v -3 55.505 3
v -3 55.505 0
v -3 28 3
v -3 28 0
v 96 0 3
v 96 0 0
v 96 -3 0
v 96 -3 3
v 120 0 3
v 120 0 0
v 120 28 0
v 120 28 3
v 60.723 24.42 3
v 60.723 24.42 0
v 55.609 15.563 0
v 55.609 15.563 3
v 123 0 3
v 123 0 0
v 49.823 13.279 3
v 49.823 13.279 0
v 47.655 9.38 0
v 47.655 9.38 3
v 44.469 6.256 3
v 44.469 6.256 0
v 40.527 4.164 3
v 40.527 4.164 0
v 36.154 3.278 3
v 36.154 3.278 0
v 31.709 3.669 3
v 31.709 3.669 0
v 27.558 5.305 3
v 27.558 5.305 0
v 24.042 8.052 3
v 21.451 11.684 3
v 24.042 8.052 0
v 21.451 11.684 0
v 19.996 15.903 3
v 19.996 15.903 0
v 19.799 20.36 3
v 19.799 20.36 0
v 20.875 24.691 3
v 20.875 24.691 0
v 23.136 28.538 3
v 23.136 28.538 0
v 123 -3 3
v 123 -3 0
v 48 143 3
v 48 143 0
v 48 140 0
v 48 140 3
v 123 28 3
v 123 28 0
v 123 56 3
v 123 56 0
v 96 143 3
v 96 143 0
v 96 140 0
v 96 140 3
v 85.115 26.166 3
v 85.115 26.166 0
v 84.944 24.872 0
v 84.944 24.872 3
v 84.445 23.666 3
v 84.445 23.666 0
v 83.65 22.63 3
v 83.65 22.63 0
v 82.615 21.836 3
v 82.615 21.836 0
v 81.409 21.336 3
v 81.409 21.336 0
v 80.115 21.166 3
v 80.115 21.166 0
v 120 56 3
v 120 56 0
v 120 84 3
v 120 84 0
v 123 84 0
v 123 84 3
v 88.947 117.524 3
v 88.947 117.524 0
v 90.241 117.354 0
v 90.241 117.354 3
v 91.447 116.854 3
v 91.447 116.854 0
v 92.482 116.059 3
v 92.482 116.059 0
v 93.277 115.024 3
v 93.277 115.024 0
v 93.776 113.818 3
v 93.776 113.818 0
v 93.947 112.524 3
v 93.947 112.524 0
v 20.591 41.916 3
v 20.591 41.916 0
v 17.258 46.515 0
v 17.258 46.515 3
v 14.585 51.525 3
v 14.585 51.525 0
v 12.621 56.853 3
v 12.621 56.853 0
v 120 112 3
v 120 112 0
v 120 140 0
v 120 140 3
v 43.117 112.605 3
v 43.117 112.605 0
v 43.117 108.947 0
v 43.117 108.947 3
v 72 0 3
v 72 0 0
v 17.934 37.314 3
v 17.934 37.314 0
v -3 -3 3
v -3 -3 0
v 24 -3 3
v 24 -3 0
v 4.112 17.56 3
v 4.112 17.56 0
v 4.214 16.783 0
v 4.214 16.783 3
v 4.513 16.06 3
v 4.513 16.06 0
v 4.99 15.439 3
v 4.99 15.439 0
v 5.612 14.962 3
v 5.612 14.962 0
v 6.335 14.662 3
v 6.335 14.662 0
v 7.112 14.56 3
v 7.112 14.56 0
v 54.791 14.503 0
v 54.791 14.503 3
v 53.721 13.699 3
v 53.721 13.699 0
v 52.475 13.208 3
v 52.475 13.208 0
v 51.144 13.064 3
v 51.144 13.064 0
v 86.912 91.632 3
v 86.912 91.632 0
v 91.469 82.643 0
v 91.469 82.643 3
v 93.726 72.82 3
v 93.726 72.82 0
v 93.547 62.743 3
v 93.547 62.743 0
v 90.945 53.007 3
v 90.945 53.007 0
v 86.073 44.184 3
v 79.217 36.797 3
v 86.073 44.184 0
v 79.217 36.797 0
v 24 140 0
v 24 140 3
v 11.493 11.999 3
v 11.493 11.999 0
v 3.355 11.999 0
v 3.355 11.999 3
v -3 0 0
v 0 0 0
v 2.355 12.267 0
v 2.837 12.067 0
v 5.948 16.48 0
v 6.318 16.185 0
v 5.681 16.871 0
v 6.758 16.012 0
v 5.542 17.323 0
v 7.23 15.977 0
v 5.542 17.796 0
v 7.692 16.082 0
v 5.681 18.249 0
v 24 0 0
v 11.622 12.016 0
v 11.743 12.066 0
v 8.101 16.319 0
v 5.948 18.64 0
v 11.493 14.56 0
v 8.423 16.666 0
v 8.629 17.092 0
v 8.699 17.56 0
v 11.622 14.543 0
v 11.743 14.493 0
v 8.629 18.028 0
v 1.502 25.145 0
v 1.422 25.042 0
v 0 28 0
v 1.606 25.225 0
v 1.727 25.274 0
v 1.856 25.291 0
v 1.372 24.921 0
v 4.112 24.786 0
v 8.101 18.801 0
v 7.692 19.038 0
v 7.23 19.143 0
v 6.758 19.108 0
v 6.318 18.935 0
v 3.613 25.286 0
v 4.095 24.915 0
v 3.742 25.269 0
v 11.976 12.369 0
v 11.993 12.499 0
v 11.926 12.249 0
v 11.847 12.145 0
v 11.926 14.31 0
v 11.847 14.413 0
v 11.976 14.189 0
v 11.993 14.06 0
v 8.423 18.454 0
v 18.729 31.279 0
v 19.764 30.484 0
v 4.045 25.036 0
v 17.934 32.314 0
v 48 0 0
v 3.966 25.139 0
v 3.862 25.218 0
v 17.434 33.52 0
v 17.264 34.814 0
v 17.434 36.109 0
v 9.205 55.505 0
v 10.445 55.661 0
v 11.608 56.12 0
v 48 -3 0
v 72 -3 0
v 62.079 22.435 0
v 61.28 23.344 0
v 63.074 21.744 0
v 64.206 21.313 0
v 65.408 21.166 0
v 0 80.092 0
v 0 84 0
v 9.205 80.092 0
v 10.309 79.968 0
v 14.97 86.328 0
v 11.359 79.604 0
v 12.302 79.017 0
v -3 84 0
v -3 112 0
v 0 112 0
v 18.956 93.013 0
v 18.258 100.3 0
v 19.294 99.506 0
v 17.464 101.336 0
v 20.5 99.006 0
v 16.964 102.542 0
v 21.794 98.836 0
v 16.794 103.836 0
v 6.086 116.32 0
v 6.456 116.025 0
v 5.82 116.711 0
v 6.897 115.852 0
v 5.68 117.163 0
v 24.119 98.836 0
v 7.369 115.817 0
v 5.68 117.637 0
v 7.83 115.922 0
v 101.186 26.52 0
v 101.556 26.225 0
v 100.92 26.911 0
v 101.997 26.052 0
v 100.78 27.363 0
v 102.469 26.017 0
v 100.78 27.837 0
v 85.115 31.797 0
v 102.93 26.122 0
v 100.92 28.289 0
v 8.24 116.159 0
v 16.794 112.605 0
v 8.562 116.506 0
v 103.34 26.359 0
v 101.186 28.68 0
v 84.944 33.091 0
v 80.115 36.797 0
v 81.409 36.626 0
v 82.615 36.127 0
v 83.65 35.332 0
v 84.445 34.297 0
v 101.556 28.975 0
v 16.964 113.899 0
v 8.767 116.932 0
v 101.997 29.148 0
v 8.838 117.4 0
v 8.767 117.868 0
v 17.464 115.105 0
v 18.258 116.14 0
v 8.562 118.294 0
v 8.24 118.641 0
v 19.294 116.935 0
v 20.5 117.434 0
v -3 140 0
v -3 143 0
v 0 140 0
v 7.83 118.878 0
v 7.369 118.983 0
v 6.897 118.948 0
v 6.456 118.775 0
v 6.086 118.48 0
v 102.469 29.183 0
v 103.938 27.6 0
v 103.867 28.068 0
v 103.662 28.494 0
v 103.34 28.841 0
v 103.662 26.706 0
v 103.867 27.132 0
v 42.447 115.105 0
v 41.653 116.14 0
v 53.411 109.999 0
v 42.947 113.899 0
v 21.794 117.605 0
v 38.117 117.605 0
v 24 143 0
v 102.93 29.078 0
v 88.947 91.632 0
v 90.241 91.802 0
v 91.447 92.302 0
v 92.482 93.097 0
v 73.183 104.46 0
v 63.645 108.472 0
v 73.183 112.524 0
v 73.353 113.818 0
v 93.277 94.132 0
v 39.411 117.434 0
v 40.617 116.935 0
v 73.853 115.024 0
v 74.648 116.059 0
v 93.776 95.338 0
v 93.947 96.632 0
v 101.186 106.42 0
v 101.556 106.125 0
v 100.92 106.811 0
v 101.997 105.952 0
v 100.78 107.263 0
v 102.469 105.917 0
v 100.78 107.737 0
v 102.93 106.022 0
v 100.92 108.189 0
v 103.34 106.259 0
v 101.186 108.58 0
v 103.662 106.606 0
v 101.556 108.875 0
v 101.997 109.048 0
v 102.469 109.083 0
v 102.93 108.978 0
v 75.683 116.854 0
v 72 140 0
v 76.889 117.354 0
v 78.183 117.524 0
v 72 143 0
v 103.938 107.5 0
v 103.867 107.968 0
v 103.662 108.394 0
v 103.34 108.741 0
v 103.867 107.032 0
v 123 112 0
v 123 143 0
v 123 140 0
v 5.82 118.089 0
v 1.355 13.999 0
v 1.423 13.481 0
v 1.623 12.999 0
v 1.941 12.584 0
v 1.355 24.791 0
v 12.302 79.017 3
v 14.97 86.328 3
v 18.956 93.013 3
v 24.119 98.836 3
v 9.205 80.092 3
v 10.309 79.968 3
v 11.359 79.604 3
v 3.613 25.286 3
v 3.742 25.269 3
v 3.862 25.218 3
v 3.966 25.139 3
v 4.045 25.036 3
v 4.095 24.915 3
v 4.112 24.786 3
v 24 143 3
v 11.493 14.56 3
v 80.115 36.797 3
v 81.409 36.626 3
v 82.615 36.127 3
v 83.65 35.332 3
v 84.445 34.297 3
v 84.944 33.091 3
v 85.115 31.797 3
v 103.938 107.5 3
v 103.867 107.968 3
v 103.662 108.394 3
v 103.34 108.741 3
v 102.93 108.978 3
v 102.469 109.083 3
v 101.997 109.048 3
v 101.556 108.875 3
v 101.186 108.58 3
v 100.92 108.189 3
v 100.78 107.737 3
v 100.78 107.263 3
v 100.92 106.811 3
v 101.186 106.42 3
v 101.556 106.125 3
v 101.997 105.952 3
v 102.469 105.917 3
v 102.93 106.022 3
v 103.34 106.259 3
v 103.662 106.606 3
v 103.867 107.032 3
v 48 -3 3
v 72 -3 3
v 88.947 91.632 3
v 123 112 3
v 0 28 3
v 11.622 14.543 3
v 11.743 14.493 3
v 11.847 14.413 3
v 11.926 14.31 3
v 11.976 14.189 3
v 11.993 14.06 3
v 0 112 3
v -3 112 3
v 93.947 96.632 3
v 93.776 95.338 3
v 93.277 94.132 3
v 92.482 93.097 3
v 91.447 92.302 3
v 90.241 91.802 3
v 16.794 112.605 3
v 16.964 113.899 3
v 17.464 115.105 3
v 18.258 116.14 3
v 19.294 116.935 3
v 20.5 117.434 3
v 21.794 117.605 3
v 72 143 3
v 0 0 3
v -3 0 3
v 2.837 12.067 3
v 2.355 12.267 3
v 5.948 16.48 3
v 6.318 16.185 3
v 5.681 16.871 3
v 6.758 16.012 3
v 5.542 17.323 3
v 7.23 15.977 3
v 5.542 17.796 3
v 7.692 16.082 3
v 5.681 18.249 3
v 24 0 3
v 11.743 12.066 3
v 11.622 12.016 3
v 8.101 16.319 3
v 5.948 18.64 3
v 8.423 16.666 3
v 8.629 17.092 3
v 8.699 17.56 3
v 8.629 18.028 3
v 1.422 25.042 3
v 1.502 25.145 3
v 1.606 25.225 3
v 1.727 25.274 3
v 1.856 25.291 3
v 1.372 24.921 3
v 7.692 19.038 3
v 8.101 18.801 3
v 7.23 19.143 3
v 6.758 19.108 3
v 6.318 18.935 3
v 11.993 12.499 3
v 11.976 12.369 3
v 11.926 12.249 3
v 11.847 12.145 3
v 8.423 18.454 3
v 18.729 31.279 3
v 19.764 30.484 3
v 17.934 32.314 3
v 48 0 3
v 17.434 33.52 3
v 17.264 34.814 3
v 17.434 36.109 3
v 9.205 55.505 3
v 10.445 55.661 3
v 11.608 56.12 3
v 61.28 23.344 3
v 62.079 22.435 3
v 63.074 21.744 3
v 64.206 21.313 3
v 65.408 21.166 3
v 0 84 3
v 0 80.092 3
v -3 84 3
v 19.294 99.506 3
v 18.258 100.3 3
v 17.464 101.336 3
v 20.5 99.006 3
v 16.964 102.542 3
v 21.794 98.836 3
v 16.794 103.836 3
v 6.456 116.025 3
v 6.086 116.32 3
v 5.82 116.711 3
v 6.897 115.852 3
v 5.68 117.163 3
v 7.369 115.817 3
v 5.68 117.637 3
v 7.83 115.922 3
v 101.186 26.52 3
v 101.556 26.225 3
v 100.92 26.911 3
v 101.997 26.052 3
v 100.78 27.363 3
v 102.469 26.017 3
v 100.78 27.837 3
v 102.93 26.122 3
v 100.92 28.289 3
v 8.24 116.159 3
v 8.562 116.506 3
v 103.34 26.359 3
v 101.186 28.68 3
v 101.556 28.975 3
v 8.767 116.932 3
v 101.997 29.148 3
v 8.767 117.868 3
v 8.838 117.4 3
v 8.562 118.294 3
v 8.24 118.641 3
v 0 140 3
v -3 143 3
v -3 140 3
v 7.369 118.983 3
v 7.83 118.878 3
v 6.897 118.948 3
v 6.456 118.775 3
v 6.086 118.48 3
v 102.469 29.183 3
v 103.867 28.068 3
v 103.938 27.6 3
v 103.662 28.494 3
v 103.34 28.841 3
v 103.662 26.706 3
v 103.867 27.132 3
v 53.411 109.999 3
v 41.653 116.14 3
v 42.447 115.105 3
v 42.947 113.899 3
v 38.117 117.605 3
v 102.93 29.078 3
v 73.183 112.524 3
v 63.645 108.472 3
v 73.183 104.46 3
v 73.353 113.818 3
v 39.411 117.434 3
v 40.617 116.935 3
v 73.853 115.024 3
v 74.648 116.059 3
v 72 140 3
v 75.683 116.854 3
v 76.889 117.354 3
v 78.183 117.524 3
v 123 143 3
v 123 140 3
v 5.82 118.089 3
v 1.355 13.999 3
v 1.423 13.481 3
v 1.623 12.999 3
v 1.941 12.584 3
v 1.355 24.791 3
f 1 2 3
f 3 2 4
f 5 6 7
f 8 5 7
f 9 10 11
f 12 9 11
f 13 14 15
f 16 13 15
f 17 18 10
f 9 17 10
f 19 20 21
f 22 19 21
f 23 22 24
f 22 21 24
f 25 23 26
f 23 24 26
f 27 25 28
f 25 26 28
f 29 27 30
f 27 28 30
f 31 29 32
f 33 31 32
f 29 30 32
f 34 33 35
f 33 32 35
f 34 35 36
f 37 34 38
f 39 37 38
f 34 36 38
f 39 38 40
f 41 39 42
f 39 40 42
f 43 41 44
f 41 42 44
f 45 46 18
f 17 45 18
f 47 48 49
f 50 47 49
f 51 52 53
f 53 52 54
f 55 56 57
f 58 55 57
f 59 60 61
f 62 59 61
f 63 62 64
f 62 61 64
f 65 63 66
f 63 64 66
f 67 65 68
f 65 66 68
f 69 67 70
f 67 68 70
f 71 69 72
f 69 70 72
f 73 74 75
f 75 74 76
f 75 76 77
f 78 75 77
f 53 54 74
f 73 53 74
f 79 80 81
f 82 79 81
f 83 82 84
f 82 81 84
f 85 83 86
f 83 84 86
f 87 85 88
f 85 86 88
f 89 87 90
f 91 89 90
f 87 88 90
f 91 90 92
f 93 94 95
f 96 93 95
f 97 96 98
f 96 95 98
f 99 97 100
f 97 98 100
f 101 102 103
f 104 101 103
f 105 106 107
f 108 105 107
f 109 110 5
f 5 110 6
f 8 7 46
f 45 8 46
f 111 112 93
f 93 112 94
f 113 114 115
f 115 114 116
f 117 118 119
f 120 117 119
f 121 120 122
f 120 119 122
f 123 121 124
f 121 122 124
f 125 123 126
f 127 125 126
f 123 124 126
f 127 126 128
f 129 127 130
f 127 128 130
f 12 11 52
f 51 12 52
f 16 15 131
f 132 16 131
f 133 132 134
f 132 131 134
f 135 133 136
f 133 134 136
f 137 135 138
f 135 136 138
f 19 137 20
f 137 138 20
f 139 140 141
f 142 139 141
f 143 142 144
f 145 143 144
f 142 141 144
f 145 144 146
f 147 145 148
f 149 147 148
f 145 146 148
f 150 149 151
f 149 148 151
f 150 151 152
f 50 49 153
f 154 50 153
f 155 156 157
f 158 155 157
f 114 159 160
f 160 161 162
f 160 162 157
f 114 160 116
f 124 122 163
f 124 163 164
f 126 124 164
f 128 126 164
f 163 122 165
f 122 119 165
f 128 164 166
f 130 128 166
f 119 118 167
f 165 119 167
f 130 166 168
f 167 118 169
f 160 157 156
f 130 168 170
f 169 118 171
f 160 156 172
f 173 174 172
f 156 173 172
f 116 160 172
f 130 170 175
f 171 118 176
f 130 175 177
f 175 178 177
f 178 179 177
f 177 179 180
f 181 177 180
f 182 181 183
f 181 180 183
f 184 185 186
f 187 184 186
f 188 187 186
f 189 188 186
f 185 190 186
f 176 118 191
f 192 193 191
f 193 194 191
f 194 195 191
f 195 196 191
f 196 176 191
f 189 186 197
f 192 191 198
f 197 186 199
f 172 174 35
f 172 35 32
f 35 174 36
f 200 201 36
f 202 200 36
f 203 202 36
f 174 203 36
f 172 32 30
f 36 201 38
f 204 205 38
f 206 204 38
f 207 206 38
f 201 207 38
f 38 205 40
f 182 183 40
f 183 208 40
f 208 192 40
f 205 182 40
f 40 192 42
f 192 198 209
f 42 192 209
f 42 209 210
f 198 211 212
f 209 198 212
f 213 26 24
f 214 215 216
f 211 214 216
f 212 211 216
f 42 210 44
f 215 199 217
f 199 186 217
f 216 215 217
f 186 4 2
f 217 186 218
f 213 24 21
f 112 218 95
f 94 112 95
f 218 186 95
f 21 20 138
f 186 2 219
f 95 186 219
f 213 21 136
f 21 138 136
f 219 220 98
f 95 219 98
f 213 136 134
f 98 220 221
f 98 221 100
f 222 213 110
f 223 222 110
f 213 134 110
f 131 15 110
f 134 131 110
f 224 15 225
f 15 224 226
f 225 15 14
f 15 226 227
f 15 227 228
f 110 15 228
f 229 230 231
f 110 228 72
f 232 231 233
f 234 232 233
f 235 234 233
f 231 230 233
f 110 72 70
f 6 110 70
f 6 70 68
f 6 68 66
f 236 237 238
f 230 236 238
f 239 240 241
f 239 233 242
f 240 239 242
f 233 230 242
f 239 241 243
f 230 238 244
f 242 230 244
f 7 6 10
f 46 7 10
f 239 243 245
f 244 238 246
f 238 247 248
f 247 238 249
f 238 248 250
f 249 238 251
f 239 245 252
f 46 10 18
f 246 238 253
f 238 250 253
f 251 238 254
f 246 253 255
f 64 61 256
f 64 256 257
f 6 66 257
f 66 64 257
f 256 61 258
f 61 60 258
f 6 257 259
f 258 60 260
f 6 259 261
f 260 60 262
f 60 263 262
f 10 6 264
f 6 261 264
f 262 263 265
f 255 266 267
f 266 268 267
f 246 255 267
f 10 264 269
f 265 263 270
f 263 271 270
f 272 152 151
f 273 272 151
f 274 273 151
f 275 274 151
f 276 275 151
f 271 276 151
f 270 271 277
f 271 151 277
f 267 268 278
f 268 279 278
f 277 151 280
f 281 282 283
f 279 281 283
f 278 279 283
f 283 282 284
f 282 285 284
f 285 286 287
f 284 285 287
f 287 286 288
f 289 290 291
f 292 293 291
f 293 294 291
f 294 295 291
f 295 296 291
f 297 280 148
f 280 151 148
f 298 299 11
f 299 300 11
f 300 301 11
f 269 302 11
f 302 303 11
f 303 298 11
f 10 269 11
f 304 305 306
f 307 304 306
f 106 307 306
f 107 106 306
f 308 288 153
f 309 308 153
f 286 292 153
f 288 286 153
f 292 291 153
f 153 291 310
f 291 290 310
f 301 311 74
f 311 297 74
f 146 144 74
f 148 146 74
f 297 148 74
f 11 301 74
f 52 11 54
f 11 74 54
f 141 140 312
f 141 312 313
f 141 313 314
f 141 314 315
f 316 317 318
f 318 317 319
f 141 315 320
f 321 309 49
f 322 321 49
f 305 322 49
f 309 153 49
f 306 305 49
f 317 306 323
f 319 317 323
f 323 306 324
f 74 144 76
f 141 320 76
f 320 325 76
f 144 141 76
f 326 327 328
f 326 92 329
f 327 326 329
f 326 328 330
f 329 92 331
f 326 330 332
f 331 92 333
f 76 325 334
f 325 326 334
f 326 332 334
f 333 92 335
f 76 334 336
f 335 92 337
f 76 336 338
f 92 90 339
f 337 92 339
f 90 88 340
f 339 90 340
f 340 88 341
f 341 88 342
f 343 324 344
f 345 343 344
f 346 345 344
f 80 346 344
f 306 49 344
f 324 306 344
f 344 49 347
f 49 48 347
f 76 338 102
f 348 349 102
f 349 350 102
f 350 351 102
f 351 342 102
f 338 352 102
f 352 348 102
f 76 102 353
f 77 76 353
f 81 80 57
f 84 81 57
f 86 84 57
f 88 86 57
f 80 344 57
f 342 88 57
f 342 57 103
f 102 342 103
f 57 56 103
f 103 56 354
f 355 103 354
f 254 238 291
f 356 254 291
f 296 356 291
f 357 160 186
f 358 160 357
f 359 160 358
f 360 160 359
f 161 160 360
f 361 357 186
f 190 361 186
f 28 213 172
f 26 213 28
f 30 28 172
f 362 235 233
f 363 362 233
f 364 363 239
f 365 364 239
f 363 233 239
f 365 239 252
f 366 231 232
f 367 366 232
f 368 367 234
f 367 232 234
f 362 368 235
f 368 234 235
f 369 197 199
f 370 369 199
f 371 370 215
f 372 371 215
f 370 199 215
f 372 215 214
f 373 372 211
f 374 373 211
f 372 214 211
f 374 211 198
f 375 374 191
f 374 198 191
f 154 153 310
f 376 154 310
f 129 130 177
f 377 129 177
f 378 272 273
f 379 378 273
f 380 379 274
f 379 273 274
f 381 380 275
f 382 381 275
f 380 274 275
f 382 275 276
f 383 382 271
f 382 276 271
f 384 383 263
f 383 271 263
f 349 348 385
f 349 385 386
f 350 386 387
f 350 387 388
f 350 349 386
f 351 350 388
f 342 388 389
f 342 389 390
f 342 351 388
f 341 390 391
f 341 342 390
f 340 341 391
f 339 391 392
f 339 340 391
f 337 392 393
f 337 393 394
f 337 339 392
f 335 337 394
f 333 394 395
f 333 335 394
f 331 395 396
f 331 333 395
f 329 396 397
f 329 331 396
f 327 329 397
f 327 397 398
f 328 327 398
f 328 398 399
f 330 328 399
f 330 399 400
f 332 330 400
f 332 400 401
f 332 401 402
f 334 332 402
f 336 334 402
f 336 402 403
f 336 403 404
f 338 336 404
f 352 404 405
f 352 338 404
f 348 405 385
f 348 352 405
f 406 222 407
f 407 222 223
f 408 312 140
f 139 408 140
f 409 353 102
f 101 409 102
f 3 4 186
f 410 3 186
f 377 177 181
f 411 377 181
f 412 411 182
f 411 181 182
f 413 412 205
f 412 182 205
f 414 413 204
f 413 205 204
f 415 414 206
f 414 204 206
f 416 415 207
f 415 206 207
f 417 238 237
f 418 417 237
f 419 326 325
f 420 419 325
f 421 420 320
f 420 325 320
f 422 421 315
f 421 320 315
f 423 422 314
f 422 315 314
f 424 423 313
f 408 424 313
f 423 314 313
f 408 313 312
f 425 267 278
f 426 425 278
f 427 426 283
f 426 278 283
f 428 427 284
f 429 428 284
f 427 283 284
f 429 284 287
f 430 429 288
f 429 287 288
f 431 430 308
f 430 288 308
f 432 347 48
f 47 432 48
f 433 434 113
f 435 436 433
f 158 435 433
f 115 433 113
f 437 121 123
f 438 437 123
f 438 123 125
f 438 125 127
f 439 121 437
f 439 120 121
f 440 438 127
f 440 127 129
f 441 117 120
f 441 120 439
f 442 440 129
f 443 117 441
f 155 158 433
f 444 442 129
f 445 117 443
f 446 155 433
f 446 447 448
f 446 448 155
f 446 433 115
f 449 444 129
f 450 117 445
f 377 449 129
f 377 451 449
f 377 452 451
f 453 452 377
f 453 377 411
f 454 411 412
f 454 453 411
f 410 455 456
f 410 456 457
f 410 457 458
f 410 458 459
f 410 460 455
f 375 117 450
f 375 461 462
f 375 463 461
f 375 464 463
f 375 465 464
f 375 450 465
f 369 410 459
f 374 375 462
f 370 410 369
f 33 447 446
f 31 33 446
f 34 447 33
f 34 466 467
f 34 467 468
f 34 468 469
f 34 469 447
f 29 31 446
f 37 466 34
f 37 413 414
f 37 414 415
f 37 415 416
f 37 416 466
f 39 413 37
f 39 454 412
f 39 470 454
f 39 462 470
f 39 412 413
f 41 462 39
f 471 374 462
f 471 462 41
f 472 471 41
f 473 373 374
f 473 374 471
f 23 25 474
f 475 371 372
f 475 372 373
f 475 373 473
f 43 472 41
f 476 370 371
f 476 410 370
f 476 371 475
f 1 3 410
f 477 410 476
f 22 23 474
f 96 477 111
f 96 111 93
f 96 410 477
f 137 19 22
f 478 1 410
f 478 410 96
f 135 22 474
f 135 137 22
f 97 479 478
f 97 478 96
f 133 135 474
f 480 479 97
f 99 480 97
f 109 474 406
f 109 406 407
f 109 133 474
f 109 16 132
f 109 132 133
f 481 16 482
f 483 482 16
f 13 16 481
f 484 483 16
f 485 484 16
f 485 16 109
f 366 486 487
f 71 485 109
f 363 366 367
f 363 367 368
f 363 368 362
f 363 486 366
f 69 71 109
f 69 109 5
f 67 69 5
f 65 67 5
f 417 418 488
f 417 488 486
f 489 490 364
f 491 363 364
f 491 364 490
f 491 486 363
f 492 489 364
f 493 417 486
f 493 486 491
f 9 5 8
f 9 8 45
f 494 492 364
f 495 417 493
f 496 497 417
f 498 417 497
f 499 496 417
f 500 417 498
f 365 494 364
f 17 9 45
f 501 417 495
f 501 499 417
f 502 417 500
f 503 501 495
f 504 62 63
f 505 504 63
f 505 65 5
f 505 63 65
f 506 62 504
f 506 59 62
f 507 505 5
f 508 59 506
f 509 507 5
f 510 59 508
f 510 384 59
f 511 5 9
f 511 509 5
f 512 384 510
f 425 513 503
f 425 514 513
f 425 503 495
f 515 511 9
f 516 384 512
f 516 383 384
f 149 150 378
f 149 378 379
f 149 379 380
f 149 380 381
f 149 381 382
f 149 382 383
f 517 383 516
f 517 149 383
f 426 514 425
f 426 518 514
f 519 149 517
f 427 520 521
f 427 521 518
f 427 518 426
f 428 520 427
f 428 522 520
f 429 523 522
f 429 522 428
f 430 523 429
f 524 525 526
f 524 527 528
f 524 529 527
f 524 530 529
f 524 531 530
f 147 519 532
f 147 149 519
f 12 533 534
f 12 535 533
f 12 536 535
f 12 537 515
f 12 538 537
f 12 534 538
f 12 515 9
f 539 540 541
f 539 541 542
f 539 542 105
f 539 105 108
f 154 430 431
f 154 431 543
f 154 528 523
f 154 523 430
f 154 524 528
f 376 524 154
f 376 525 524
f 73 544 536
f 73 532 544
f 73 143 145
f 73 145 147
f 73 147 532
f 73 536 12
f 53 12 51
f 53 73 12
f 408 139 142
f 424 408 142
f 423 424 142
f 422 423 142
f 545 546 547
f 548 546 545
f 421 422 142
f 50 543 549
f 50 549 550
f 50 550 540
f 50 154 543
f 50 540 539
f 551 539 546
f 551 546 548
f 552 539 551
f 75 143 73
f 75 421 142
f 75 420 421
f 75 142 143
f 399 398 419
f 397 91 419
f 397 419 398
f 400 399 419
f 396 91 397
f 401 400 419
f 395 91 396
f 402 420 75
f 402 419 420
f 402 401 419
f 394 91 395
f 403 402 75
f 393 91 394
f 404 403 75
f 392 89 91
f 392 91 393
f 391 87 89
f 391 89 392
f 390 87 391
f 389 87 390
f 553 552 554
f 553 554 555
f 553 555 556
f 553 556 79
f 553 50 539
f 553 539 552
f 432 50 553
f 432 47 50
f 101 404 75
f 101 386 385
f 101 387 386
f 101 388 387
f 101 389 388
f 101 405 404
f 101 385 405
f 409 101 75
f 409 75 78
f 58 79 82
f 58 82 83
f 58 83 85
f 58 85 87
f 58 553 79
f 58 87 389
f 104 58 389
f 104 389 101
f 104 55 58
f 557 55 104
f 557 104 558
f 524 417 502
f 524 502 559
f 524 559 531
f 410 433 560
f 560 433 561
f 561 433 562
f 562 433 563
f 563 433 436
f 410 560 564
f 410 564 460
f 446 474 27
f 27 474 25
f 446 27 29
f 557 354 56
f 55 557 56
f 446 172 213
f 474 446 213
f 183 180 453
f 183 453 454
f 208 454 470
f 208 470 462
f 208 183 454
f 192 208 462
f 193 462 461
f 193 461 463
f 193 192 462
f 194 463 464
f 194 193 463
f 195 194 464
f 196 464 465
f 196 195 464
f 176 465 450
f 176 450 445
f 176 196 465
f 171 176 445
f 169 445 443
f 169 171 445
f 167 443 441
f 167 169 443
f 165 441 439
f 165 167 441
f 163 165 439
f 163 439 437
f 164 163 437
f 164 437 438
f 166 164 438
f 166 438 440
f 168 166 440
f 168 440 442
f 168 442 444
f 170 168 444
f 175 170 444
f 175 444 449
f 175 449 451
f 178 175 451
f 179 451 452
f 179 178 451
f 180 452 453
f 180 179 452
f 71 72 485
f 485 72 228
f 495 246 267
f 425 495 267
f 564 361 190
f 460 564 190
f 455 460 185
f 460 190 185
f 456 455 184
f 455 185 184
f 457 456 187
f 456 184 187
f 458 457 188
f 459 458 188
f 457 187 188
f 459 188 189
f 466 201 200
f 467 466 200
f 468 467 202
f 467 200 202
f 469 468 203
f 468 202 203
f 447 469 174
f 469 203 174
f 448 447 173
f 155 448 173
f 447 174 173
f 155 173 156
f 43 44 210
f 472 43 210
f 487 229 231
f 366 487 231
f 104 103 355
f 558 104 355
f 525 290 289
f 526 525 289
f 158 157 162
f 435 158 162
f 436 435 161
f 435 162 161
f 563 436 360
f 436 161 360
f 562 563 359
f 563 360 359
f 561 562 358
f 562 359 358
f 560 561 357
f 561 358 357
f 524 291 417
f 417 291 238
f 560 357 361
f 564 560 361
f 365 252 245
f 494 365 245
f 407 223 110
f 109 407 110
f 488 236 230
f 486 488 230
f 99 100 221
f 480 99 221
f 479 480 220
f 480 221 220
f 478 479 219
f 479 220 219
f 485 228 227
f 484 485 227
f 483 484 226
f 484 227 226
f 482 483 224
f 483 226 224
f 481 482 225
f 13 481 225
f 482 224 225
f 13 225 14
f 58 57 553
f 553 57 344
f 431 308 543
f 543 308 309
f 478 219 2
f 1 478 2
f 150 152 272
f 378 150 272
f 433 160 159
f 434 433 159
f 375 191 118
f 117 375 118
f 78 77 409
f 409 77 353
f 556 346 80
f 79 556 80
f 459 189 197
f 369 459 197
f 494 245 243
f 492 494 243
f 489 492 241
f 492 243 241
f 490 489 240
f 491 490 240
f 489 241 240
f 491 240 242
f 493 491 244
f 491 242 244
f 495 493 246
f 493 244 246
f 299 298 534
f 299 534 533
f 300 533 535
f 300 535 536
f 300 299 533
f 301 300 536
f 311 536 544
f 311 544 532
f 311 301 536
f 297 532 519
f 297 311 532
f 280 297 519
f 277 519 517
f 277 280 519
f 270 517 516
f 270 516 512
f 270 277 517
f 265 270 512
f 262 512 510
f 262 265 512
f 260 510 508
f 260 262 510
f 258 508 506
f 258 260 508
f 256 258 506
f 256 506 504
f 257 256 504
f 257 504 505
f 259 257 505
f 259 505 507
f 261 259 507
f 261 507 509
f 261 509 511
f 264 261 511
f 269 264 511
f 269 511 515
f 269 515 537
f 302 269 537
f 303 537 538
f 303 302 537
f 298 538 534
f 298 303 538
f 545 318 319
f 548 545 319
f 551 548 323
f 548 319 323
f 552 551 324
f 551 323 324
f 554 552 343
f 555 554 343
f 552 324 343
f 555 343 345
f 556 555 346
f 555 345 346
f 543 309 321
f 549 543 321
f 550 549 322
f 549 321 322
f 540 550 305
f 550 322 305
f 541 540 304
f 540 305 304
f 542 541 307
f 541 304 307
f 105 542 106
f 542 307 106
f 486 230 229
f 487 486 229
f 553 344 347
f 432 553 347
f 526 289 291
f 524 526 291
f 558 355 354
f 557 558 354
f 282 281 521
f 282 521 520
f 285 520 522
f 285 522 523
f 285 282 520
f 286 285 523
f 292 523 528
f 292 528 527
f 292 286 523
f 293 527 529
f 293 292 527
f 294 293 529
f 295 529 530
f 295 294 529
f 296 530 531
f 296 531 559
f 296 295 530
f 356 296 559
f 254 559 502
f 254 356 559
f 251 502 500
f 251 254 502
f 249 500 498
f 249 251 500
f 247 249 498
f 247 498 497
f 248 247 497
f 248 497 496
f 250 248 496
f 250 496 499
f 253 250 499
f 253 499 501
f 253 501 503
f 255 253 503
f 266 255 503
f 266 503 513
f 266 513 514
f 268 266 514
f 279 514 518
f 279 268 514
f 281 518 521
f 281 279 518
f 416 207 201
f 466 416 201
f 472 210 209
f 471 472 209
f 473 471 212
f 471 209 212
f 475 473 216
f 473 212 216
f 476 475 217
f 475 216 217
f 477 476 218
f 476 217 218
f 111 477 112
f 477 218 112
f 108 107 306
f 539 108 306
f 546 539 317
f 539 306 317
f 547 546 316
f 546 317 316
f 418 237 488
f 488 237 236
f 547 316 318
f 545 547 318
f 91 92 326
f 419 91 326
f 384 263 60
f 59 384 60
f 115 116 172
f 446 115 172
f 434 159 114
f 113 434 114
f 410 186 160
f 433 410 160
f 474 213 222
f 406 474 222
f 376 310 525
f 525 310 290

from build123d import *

# Parameters (mm, degrees)
SKETCH1_R           = 1.5875
BOSS_EXTRUDE1_DEPTH = 3


with BuildPart() as part:
    # Sketch1 → Boss-Extrude1 (new body)
    with BuildSketch(Plane.XY):
        with BuildLine():
            Line((48, 140), (24, 140))
            Line((24, 140), (24, 143))
            Line((24, 143), (-3, 143))
            Line((-3, 143), (-3, 140))
            Line((-3, 140), (0, 140))
            Line((0, 140), (0, 112))
            Line((0, 112), (-3, 112))
            Line((-3, 112), (-3, 84))
            Line((-3, 84), (0, 84))
            Line((0, 84), (0, 80.091592476))
            Line((0, 80.091592476), (9.204842615, 80.091592476))
            ThreePointArc((9.204842615, 80.091592476), (10.844002051, 79.815272857), (12.301988723, 79.016855013))
            ThreePointArc((12.301988723, 79.016855013), (16.805573917, 89.764144743), (24.1194552, 98.835729872))
            Line((24.1194552, 98.835729872), (21.793869689, 98.835729872))
            ThreePointArc((21.793869689, 98.835729872), (18.258335784, 100.300195966), (16.793869689, 103.835729872))
            Line((16.793869689, 103.835729872), (16.793869689, 112.604597993))
            ThreePointArc((16.793869689, 112.604597993), (18.258335784, 116.140131899), (21.793869689, 117.604597993))
            Line((21.793869689, 117.604597993), (38.117364989, 117.604597993))
            ThreePointArc((38.117364989, 117.604597993), (41.652898895, 116.140131899), (43.117364989, 112.604597993))
            Line((43.117364989, 112.604597993), (43.117364989, 108.94733597))
            ThreePointArc((43.117364989, 108.94733597), (58.575877607, 109.555709088), (73.183096051, 104.460132622))
            Line((73.183096051, 104.460132622), (73.183096051, 112.523924668))
            ThreePointArc((73.183096051, 112.523924668), (74.647562145, 116.059458574), (78.183096051, 117.523924668))
            Line((78.183096051, 117.523924668), (88.946846839, 117.523924668))
            ThreePointArc((88.946846839, 117.523924668), (92.482380745, 116.059458574), (93.946846839, 112.523924668))
            Line((93.946846839, 112.523924668), (93.946846839, 96.632091269))
            ThreePointArc((93.946846839, 96.632091269), (92.482380745, 93.096557363), (88.946846839, 91.632091269))
            Line((88.946846839, 91.632091269), (86.912064447, 91.632091269))
            ThreePointArc((86.912064447, 91.632091269), (93.547360155, 62.743436939), (79.217418381, 36.796678628))
            Line((79.217418381, 36.796678628), (80.114705661, 36.796678628))
            ThreePointArc((80.114705661, 36.796678628), (83.650239567, 35.332212534), (85.114705661, 31.796678628))
            Line((85.114705661, 31.796678628), (85.114705661, 26.165851447))
            ThreePointArc((85.114705661, 26.165851447), (83.650239567, 22.630317541), (80.114705661, 21.165851447))
            Line((80.114705661, 21.165851447), (65.40791431, 21.165851447))
            ThreePointArc((65.40791431, 21.165851447), (62.555840914, 22.059067139), (60.722774204, 24.419580508))
            Line((60.722774204, 24.419580508), (55.609195041, 15.562601589))
            ThreePointArc((55.609195041, 15.562601589), (53.114505039, 13.411669321), (49.823236264, 13.279239393))
            ThreePointArc((49.823236264, 13.279239393), (27.558248735, 5.305071401), (23.135588282, 28.537744501))
            Line((23.135588282, 28.537744501), (19.764061802, 30.484296222))
            ThreePointArc((19.764061802, 30.484296222), (17.434432671, 33.520328015), (17.933934783, 37.314423241))
            Line((17.933934783, 37.314423241), (20.590822265, 41.91628735))
            ThreePointArc((20.590822265, 41.91628735), (15.836008812, 48.974059185), (12.620809049, 56.853328488))
            ThreePointArc((12.620809049, 56.853328488), (11.041151458, 55.853928303), (9.204842615, 55.50451642))
            Line((9.204842615, 55.50451642), (-3, 55.50451642))
            Line((-3, 55.50451642), (-3, 28))
            Line((-3, 28), (0, 28))
            Line((0, 28), (0, 0))
            Line((0, 0), (-3, 0))
            Line((-3, 0), (-3, -3))
            Line((-3, -3), (24, -3))
            Line((24, -3), (24, 0))
            Line((24, 0), (48, 0))
            Line((48, 0), (48, -3))
            Line((48, -3), (72, -3))
            Line((72, -3), (72, 0))
            Line((72, 0), (96, 0))
            Line((96, 0), (96, -3))
            Line((96, -3), (123, -3))
            Line((123, -3), (123, 0))
            Line((123, 0), (120, 0))
            Line((120, 0), (120, 28))
            Line((120, 28), (123, 28))
            Line((123, 28), (123, 56))
            Line((123, 56), (120, 56))
            Line((120, 56), (120, 84))
            Line((120, 84), (123, 84))
            Line((123, 84), (123, 112))
            Line((123, 112), (120, 112))
            Line((120, 112), (120, 140))
            Line((120, 140), (123, 140))
            Line((123, 140), (123, 143))
            Line((123, 143), (96, 143))
            Line((96, 143), (96, 140))
            Line((96, 140), (72, 140))
            Line((72, 140), (72, 143))
            Line((72, 143), (48, 143))
            Line((48, 143), (48, 140))
        make_face()
        with Locations((7.111536912, 17.559834216)):
            Circle(SKETCH1_R, mode=Mode.SUBTRACT)
        with BuildLine():
            ThreePointArc((11.493043158, 14.559834216), (11.846596549, 14.413387607), (11.993043158, 14.059834216))
            Line((11.993043158, 14.059834216), (11.993043158, 12.498677253))
            ThreePointArc((11.993043158, 12.498677253), (11.846596549, 12.145123862), (11.493043158, 11.998677253))
            Line((11.493043158, 11.998677253), (3.35499228, 11.998677253))
            ThreePointArc((3.35499228, 11.998677253), (1.940778717, 12.58446369), (1.35499228, 13.998677253))
            Line((1.35499228, 13.998677253), (1.35499228, 24.79117874))
            ThreePointArc((1.35499228, 24.79117874), (1.501964385, 25.145256847), (1.856477503, 25.291176534))
            Line((1.856477503, 25.291176534), (3.613022136, 25.285958787))
            ThreePointArc((3.613022136, 25.285958787), (3.965615019, 25.138988887), (4.111536912, 24.785960993))
            Line((4.111536912, 24.785960993), (4.111536912, 17.559834216))
            ThreePointArc((4.111536912, 17.559834216), (4.990216569, 15.438513872), (7.111536912, 14.559834216))
            Line((7.111536912, 14.559834216), (11.493043158, 14.559834216))
        make_face(mode=Mode.SUBTRACT)
        with Locations((102.35, 27.6)):
            Circle(SKETCH1_R, mode=Mode.SUBTRACT)
        with Locations((7.25, 117.4)):
            Circle(SKETCH1_R, mode=Mode.SUBTRACT)
        with Locations((102.35, 107.5)):
            Circle(SKETCH1_R, mode=Mode.SUBTRACT)
    extrude(amount=BOSS_EXTRUDE1_DEPTH)


solid = part.part
